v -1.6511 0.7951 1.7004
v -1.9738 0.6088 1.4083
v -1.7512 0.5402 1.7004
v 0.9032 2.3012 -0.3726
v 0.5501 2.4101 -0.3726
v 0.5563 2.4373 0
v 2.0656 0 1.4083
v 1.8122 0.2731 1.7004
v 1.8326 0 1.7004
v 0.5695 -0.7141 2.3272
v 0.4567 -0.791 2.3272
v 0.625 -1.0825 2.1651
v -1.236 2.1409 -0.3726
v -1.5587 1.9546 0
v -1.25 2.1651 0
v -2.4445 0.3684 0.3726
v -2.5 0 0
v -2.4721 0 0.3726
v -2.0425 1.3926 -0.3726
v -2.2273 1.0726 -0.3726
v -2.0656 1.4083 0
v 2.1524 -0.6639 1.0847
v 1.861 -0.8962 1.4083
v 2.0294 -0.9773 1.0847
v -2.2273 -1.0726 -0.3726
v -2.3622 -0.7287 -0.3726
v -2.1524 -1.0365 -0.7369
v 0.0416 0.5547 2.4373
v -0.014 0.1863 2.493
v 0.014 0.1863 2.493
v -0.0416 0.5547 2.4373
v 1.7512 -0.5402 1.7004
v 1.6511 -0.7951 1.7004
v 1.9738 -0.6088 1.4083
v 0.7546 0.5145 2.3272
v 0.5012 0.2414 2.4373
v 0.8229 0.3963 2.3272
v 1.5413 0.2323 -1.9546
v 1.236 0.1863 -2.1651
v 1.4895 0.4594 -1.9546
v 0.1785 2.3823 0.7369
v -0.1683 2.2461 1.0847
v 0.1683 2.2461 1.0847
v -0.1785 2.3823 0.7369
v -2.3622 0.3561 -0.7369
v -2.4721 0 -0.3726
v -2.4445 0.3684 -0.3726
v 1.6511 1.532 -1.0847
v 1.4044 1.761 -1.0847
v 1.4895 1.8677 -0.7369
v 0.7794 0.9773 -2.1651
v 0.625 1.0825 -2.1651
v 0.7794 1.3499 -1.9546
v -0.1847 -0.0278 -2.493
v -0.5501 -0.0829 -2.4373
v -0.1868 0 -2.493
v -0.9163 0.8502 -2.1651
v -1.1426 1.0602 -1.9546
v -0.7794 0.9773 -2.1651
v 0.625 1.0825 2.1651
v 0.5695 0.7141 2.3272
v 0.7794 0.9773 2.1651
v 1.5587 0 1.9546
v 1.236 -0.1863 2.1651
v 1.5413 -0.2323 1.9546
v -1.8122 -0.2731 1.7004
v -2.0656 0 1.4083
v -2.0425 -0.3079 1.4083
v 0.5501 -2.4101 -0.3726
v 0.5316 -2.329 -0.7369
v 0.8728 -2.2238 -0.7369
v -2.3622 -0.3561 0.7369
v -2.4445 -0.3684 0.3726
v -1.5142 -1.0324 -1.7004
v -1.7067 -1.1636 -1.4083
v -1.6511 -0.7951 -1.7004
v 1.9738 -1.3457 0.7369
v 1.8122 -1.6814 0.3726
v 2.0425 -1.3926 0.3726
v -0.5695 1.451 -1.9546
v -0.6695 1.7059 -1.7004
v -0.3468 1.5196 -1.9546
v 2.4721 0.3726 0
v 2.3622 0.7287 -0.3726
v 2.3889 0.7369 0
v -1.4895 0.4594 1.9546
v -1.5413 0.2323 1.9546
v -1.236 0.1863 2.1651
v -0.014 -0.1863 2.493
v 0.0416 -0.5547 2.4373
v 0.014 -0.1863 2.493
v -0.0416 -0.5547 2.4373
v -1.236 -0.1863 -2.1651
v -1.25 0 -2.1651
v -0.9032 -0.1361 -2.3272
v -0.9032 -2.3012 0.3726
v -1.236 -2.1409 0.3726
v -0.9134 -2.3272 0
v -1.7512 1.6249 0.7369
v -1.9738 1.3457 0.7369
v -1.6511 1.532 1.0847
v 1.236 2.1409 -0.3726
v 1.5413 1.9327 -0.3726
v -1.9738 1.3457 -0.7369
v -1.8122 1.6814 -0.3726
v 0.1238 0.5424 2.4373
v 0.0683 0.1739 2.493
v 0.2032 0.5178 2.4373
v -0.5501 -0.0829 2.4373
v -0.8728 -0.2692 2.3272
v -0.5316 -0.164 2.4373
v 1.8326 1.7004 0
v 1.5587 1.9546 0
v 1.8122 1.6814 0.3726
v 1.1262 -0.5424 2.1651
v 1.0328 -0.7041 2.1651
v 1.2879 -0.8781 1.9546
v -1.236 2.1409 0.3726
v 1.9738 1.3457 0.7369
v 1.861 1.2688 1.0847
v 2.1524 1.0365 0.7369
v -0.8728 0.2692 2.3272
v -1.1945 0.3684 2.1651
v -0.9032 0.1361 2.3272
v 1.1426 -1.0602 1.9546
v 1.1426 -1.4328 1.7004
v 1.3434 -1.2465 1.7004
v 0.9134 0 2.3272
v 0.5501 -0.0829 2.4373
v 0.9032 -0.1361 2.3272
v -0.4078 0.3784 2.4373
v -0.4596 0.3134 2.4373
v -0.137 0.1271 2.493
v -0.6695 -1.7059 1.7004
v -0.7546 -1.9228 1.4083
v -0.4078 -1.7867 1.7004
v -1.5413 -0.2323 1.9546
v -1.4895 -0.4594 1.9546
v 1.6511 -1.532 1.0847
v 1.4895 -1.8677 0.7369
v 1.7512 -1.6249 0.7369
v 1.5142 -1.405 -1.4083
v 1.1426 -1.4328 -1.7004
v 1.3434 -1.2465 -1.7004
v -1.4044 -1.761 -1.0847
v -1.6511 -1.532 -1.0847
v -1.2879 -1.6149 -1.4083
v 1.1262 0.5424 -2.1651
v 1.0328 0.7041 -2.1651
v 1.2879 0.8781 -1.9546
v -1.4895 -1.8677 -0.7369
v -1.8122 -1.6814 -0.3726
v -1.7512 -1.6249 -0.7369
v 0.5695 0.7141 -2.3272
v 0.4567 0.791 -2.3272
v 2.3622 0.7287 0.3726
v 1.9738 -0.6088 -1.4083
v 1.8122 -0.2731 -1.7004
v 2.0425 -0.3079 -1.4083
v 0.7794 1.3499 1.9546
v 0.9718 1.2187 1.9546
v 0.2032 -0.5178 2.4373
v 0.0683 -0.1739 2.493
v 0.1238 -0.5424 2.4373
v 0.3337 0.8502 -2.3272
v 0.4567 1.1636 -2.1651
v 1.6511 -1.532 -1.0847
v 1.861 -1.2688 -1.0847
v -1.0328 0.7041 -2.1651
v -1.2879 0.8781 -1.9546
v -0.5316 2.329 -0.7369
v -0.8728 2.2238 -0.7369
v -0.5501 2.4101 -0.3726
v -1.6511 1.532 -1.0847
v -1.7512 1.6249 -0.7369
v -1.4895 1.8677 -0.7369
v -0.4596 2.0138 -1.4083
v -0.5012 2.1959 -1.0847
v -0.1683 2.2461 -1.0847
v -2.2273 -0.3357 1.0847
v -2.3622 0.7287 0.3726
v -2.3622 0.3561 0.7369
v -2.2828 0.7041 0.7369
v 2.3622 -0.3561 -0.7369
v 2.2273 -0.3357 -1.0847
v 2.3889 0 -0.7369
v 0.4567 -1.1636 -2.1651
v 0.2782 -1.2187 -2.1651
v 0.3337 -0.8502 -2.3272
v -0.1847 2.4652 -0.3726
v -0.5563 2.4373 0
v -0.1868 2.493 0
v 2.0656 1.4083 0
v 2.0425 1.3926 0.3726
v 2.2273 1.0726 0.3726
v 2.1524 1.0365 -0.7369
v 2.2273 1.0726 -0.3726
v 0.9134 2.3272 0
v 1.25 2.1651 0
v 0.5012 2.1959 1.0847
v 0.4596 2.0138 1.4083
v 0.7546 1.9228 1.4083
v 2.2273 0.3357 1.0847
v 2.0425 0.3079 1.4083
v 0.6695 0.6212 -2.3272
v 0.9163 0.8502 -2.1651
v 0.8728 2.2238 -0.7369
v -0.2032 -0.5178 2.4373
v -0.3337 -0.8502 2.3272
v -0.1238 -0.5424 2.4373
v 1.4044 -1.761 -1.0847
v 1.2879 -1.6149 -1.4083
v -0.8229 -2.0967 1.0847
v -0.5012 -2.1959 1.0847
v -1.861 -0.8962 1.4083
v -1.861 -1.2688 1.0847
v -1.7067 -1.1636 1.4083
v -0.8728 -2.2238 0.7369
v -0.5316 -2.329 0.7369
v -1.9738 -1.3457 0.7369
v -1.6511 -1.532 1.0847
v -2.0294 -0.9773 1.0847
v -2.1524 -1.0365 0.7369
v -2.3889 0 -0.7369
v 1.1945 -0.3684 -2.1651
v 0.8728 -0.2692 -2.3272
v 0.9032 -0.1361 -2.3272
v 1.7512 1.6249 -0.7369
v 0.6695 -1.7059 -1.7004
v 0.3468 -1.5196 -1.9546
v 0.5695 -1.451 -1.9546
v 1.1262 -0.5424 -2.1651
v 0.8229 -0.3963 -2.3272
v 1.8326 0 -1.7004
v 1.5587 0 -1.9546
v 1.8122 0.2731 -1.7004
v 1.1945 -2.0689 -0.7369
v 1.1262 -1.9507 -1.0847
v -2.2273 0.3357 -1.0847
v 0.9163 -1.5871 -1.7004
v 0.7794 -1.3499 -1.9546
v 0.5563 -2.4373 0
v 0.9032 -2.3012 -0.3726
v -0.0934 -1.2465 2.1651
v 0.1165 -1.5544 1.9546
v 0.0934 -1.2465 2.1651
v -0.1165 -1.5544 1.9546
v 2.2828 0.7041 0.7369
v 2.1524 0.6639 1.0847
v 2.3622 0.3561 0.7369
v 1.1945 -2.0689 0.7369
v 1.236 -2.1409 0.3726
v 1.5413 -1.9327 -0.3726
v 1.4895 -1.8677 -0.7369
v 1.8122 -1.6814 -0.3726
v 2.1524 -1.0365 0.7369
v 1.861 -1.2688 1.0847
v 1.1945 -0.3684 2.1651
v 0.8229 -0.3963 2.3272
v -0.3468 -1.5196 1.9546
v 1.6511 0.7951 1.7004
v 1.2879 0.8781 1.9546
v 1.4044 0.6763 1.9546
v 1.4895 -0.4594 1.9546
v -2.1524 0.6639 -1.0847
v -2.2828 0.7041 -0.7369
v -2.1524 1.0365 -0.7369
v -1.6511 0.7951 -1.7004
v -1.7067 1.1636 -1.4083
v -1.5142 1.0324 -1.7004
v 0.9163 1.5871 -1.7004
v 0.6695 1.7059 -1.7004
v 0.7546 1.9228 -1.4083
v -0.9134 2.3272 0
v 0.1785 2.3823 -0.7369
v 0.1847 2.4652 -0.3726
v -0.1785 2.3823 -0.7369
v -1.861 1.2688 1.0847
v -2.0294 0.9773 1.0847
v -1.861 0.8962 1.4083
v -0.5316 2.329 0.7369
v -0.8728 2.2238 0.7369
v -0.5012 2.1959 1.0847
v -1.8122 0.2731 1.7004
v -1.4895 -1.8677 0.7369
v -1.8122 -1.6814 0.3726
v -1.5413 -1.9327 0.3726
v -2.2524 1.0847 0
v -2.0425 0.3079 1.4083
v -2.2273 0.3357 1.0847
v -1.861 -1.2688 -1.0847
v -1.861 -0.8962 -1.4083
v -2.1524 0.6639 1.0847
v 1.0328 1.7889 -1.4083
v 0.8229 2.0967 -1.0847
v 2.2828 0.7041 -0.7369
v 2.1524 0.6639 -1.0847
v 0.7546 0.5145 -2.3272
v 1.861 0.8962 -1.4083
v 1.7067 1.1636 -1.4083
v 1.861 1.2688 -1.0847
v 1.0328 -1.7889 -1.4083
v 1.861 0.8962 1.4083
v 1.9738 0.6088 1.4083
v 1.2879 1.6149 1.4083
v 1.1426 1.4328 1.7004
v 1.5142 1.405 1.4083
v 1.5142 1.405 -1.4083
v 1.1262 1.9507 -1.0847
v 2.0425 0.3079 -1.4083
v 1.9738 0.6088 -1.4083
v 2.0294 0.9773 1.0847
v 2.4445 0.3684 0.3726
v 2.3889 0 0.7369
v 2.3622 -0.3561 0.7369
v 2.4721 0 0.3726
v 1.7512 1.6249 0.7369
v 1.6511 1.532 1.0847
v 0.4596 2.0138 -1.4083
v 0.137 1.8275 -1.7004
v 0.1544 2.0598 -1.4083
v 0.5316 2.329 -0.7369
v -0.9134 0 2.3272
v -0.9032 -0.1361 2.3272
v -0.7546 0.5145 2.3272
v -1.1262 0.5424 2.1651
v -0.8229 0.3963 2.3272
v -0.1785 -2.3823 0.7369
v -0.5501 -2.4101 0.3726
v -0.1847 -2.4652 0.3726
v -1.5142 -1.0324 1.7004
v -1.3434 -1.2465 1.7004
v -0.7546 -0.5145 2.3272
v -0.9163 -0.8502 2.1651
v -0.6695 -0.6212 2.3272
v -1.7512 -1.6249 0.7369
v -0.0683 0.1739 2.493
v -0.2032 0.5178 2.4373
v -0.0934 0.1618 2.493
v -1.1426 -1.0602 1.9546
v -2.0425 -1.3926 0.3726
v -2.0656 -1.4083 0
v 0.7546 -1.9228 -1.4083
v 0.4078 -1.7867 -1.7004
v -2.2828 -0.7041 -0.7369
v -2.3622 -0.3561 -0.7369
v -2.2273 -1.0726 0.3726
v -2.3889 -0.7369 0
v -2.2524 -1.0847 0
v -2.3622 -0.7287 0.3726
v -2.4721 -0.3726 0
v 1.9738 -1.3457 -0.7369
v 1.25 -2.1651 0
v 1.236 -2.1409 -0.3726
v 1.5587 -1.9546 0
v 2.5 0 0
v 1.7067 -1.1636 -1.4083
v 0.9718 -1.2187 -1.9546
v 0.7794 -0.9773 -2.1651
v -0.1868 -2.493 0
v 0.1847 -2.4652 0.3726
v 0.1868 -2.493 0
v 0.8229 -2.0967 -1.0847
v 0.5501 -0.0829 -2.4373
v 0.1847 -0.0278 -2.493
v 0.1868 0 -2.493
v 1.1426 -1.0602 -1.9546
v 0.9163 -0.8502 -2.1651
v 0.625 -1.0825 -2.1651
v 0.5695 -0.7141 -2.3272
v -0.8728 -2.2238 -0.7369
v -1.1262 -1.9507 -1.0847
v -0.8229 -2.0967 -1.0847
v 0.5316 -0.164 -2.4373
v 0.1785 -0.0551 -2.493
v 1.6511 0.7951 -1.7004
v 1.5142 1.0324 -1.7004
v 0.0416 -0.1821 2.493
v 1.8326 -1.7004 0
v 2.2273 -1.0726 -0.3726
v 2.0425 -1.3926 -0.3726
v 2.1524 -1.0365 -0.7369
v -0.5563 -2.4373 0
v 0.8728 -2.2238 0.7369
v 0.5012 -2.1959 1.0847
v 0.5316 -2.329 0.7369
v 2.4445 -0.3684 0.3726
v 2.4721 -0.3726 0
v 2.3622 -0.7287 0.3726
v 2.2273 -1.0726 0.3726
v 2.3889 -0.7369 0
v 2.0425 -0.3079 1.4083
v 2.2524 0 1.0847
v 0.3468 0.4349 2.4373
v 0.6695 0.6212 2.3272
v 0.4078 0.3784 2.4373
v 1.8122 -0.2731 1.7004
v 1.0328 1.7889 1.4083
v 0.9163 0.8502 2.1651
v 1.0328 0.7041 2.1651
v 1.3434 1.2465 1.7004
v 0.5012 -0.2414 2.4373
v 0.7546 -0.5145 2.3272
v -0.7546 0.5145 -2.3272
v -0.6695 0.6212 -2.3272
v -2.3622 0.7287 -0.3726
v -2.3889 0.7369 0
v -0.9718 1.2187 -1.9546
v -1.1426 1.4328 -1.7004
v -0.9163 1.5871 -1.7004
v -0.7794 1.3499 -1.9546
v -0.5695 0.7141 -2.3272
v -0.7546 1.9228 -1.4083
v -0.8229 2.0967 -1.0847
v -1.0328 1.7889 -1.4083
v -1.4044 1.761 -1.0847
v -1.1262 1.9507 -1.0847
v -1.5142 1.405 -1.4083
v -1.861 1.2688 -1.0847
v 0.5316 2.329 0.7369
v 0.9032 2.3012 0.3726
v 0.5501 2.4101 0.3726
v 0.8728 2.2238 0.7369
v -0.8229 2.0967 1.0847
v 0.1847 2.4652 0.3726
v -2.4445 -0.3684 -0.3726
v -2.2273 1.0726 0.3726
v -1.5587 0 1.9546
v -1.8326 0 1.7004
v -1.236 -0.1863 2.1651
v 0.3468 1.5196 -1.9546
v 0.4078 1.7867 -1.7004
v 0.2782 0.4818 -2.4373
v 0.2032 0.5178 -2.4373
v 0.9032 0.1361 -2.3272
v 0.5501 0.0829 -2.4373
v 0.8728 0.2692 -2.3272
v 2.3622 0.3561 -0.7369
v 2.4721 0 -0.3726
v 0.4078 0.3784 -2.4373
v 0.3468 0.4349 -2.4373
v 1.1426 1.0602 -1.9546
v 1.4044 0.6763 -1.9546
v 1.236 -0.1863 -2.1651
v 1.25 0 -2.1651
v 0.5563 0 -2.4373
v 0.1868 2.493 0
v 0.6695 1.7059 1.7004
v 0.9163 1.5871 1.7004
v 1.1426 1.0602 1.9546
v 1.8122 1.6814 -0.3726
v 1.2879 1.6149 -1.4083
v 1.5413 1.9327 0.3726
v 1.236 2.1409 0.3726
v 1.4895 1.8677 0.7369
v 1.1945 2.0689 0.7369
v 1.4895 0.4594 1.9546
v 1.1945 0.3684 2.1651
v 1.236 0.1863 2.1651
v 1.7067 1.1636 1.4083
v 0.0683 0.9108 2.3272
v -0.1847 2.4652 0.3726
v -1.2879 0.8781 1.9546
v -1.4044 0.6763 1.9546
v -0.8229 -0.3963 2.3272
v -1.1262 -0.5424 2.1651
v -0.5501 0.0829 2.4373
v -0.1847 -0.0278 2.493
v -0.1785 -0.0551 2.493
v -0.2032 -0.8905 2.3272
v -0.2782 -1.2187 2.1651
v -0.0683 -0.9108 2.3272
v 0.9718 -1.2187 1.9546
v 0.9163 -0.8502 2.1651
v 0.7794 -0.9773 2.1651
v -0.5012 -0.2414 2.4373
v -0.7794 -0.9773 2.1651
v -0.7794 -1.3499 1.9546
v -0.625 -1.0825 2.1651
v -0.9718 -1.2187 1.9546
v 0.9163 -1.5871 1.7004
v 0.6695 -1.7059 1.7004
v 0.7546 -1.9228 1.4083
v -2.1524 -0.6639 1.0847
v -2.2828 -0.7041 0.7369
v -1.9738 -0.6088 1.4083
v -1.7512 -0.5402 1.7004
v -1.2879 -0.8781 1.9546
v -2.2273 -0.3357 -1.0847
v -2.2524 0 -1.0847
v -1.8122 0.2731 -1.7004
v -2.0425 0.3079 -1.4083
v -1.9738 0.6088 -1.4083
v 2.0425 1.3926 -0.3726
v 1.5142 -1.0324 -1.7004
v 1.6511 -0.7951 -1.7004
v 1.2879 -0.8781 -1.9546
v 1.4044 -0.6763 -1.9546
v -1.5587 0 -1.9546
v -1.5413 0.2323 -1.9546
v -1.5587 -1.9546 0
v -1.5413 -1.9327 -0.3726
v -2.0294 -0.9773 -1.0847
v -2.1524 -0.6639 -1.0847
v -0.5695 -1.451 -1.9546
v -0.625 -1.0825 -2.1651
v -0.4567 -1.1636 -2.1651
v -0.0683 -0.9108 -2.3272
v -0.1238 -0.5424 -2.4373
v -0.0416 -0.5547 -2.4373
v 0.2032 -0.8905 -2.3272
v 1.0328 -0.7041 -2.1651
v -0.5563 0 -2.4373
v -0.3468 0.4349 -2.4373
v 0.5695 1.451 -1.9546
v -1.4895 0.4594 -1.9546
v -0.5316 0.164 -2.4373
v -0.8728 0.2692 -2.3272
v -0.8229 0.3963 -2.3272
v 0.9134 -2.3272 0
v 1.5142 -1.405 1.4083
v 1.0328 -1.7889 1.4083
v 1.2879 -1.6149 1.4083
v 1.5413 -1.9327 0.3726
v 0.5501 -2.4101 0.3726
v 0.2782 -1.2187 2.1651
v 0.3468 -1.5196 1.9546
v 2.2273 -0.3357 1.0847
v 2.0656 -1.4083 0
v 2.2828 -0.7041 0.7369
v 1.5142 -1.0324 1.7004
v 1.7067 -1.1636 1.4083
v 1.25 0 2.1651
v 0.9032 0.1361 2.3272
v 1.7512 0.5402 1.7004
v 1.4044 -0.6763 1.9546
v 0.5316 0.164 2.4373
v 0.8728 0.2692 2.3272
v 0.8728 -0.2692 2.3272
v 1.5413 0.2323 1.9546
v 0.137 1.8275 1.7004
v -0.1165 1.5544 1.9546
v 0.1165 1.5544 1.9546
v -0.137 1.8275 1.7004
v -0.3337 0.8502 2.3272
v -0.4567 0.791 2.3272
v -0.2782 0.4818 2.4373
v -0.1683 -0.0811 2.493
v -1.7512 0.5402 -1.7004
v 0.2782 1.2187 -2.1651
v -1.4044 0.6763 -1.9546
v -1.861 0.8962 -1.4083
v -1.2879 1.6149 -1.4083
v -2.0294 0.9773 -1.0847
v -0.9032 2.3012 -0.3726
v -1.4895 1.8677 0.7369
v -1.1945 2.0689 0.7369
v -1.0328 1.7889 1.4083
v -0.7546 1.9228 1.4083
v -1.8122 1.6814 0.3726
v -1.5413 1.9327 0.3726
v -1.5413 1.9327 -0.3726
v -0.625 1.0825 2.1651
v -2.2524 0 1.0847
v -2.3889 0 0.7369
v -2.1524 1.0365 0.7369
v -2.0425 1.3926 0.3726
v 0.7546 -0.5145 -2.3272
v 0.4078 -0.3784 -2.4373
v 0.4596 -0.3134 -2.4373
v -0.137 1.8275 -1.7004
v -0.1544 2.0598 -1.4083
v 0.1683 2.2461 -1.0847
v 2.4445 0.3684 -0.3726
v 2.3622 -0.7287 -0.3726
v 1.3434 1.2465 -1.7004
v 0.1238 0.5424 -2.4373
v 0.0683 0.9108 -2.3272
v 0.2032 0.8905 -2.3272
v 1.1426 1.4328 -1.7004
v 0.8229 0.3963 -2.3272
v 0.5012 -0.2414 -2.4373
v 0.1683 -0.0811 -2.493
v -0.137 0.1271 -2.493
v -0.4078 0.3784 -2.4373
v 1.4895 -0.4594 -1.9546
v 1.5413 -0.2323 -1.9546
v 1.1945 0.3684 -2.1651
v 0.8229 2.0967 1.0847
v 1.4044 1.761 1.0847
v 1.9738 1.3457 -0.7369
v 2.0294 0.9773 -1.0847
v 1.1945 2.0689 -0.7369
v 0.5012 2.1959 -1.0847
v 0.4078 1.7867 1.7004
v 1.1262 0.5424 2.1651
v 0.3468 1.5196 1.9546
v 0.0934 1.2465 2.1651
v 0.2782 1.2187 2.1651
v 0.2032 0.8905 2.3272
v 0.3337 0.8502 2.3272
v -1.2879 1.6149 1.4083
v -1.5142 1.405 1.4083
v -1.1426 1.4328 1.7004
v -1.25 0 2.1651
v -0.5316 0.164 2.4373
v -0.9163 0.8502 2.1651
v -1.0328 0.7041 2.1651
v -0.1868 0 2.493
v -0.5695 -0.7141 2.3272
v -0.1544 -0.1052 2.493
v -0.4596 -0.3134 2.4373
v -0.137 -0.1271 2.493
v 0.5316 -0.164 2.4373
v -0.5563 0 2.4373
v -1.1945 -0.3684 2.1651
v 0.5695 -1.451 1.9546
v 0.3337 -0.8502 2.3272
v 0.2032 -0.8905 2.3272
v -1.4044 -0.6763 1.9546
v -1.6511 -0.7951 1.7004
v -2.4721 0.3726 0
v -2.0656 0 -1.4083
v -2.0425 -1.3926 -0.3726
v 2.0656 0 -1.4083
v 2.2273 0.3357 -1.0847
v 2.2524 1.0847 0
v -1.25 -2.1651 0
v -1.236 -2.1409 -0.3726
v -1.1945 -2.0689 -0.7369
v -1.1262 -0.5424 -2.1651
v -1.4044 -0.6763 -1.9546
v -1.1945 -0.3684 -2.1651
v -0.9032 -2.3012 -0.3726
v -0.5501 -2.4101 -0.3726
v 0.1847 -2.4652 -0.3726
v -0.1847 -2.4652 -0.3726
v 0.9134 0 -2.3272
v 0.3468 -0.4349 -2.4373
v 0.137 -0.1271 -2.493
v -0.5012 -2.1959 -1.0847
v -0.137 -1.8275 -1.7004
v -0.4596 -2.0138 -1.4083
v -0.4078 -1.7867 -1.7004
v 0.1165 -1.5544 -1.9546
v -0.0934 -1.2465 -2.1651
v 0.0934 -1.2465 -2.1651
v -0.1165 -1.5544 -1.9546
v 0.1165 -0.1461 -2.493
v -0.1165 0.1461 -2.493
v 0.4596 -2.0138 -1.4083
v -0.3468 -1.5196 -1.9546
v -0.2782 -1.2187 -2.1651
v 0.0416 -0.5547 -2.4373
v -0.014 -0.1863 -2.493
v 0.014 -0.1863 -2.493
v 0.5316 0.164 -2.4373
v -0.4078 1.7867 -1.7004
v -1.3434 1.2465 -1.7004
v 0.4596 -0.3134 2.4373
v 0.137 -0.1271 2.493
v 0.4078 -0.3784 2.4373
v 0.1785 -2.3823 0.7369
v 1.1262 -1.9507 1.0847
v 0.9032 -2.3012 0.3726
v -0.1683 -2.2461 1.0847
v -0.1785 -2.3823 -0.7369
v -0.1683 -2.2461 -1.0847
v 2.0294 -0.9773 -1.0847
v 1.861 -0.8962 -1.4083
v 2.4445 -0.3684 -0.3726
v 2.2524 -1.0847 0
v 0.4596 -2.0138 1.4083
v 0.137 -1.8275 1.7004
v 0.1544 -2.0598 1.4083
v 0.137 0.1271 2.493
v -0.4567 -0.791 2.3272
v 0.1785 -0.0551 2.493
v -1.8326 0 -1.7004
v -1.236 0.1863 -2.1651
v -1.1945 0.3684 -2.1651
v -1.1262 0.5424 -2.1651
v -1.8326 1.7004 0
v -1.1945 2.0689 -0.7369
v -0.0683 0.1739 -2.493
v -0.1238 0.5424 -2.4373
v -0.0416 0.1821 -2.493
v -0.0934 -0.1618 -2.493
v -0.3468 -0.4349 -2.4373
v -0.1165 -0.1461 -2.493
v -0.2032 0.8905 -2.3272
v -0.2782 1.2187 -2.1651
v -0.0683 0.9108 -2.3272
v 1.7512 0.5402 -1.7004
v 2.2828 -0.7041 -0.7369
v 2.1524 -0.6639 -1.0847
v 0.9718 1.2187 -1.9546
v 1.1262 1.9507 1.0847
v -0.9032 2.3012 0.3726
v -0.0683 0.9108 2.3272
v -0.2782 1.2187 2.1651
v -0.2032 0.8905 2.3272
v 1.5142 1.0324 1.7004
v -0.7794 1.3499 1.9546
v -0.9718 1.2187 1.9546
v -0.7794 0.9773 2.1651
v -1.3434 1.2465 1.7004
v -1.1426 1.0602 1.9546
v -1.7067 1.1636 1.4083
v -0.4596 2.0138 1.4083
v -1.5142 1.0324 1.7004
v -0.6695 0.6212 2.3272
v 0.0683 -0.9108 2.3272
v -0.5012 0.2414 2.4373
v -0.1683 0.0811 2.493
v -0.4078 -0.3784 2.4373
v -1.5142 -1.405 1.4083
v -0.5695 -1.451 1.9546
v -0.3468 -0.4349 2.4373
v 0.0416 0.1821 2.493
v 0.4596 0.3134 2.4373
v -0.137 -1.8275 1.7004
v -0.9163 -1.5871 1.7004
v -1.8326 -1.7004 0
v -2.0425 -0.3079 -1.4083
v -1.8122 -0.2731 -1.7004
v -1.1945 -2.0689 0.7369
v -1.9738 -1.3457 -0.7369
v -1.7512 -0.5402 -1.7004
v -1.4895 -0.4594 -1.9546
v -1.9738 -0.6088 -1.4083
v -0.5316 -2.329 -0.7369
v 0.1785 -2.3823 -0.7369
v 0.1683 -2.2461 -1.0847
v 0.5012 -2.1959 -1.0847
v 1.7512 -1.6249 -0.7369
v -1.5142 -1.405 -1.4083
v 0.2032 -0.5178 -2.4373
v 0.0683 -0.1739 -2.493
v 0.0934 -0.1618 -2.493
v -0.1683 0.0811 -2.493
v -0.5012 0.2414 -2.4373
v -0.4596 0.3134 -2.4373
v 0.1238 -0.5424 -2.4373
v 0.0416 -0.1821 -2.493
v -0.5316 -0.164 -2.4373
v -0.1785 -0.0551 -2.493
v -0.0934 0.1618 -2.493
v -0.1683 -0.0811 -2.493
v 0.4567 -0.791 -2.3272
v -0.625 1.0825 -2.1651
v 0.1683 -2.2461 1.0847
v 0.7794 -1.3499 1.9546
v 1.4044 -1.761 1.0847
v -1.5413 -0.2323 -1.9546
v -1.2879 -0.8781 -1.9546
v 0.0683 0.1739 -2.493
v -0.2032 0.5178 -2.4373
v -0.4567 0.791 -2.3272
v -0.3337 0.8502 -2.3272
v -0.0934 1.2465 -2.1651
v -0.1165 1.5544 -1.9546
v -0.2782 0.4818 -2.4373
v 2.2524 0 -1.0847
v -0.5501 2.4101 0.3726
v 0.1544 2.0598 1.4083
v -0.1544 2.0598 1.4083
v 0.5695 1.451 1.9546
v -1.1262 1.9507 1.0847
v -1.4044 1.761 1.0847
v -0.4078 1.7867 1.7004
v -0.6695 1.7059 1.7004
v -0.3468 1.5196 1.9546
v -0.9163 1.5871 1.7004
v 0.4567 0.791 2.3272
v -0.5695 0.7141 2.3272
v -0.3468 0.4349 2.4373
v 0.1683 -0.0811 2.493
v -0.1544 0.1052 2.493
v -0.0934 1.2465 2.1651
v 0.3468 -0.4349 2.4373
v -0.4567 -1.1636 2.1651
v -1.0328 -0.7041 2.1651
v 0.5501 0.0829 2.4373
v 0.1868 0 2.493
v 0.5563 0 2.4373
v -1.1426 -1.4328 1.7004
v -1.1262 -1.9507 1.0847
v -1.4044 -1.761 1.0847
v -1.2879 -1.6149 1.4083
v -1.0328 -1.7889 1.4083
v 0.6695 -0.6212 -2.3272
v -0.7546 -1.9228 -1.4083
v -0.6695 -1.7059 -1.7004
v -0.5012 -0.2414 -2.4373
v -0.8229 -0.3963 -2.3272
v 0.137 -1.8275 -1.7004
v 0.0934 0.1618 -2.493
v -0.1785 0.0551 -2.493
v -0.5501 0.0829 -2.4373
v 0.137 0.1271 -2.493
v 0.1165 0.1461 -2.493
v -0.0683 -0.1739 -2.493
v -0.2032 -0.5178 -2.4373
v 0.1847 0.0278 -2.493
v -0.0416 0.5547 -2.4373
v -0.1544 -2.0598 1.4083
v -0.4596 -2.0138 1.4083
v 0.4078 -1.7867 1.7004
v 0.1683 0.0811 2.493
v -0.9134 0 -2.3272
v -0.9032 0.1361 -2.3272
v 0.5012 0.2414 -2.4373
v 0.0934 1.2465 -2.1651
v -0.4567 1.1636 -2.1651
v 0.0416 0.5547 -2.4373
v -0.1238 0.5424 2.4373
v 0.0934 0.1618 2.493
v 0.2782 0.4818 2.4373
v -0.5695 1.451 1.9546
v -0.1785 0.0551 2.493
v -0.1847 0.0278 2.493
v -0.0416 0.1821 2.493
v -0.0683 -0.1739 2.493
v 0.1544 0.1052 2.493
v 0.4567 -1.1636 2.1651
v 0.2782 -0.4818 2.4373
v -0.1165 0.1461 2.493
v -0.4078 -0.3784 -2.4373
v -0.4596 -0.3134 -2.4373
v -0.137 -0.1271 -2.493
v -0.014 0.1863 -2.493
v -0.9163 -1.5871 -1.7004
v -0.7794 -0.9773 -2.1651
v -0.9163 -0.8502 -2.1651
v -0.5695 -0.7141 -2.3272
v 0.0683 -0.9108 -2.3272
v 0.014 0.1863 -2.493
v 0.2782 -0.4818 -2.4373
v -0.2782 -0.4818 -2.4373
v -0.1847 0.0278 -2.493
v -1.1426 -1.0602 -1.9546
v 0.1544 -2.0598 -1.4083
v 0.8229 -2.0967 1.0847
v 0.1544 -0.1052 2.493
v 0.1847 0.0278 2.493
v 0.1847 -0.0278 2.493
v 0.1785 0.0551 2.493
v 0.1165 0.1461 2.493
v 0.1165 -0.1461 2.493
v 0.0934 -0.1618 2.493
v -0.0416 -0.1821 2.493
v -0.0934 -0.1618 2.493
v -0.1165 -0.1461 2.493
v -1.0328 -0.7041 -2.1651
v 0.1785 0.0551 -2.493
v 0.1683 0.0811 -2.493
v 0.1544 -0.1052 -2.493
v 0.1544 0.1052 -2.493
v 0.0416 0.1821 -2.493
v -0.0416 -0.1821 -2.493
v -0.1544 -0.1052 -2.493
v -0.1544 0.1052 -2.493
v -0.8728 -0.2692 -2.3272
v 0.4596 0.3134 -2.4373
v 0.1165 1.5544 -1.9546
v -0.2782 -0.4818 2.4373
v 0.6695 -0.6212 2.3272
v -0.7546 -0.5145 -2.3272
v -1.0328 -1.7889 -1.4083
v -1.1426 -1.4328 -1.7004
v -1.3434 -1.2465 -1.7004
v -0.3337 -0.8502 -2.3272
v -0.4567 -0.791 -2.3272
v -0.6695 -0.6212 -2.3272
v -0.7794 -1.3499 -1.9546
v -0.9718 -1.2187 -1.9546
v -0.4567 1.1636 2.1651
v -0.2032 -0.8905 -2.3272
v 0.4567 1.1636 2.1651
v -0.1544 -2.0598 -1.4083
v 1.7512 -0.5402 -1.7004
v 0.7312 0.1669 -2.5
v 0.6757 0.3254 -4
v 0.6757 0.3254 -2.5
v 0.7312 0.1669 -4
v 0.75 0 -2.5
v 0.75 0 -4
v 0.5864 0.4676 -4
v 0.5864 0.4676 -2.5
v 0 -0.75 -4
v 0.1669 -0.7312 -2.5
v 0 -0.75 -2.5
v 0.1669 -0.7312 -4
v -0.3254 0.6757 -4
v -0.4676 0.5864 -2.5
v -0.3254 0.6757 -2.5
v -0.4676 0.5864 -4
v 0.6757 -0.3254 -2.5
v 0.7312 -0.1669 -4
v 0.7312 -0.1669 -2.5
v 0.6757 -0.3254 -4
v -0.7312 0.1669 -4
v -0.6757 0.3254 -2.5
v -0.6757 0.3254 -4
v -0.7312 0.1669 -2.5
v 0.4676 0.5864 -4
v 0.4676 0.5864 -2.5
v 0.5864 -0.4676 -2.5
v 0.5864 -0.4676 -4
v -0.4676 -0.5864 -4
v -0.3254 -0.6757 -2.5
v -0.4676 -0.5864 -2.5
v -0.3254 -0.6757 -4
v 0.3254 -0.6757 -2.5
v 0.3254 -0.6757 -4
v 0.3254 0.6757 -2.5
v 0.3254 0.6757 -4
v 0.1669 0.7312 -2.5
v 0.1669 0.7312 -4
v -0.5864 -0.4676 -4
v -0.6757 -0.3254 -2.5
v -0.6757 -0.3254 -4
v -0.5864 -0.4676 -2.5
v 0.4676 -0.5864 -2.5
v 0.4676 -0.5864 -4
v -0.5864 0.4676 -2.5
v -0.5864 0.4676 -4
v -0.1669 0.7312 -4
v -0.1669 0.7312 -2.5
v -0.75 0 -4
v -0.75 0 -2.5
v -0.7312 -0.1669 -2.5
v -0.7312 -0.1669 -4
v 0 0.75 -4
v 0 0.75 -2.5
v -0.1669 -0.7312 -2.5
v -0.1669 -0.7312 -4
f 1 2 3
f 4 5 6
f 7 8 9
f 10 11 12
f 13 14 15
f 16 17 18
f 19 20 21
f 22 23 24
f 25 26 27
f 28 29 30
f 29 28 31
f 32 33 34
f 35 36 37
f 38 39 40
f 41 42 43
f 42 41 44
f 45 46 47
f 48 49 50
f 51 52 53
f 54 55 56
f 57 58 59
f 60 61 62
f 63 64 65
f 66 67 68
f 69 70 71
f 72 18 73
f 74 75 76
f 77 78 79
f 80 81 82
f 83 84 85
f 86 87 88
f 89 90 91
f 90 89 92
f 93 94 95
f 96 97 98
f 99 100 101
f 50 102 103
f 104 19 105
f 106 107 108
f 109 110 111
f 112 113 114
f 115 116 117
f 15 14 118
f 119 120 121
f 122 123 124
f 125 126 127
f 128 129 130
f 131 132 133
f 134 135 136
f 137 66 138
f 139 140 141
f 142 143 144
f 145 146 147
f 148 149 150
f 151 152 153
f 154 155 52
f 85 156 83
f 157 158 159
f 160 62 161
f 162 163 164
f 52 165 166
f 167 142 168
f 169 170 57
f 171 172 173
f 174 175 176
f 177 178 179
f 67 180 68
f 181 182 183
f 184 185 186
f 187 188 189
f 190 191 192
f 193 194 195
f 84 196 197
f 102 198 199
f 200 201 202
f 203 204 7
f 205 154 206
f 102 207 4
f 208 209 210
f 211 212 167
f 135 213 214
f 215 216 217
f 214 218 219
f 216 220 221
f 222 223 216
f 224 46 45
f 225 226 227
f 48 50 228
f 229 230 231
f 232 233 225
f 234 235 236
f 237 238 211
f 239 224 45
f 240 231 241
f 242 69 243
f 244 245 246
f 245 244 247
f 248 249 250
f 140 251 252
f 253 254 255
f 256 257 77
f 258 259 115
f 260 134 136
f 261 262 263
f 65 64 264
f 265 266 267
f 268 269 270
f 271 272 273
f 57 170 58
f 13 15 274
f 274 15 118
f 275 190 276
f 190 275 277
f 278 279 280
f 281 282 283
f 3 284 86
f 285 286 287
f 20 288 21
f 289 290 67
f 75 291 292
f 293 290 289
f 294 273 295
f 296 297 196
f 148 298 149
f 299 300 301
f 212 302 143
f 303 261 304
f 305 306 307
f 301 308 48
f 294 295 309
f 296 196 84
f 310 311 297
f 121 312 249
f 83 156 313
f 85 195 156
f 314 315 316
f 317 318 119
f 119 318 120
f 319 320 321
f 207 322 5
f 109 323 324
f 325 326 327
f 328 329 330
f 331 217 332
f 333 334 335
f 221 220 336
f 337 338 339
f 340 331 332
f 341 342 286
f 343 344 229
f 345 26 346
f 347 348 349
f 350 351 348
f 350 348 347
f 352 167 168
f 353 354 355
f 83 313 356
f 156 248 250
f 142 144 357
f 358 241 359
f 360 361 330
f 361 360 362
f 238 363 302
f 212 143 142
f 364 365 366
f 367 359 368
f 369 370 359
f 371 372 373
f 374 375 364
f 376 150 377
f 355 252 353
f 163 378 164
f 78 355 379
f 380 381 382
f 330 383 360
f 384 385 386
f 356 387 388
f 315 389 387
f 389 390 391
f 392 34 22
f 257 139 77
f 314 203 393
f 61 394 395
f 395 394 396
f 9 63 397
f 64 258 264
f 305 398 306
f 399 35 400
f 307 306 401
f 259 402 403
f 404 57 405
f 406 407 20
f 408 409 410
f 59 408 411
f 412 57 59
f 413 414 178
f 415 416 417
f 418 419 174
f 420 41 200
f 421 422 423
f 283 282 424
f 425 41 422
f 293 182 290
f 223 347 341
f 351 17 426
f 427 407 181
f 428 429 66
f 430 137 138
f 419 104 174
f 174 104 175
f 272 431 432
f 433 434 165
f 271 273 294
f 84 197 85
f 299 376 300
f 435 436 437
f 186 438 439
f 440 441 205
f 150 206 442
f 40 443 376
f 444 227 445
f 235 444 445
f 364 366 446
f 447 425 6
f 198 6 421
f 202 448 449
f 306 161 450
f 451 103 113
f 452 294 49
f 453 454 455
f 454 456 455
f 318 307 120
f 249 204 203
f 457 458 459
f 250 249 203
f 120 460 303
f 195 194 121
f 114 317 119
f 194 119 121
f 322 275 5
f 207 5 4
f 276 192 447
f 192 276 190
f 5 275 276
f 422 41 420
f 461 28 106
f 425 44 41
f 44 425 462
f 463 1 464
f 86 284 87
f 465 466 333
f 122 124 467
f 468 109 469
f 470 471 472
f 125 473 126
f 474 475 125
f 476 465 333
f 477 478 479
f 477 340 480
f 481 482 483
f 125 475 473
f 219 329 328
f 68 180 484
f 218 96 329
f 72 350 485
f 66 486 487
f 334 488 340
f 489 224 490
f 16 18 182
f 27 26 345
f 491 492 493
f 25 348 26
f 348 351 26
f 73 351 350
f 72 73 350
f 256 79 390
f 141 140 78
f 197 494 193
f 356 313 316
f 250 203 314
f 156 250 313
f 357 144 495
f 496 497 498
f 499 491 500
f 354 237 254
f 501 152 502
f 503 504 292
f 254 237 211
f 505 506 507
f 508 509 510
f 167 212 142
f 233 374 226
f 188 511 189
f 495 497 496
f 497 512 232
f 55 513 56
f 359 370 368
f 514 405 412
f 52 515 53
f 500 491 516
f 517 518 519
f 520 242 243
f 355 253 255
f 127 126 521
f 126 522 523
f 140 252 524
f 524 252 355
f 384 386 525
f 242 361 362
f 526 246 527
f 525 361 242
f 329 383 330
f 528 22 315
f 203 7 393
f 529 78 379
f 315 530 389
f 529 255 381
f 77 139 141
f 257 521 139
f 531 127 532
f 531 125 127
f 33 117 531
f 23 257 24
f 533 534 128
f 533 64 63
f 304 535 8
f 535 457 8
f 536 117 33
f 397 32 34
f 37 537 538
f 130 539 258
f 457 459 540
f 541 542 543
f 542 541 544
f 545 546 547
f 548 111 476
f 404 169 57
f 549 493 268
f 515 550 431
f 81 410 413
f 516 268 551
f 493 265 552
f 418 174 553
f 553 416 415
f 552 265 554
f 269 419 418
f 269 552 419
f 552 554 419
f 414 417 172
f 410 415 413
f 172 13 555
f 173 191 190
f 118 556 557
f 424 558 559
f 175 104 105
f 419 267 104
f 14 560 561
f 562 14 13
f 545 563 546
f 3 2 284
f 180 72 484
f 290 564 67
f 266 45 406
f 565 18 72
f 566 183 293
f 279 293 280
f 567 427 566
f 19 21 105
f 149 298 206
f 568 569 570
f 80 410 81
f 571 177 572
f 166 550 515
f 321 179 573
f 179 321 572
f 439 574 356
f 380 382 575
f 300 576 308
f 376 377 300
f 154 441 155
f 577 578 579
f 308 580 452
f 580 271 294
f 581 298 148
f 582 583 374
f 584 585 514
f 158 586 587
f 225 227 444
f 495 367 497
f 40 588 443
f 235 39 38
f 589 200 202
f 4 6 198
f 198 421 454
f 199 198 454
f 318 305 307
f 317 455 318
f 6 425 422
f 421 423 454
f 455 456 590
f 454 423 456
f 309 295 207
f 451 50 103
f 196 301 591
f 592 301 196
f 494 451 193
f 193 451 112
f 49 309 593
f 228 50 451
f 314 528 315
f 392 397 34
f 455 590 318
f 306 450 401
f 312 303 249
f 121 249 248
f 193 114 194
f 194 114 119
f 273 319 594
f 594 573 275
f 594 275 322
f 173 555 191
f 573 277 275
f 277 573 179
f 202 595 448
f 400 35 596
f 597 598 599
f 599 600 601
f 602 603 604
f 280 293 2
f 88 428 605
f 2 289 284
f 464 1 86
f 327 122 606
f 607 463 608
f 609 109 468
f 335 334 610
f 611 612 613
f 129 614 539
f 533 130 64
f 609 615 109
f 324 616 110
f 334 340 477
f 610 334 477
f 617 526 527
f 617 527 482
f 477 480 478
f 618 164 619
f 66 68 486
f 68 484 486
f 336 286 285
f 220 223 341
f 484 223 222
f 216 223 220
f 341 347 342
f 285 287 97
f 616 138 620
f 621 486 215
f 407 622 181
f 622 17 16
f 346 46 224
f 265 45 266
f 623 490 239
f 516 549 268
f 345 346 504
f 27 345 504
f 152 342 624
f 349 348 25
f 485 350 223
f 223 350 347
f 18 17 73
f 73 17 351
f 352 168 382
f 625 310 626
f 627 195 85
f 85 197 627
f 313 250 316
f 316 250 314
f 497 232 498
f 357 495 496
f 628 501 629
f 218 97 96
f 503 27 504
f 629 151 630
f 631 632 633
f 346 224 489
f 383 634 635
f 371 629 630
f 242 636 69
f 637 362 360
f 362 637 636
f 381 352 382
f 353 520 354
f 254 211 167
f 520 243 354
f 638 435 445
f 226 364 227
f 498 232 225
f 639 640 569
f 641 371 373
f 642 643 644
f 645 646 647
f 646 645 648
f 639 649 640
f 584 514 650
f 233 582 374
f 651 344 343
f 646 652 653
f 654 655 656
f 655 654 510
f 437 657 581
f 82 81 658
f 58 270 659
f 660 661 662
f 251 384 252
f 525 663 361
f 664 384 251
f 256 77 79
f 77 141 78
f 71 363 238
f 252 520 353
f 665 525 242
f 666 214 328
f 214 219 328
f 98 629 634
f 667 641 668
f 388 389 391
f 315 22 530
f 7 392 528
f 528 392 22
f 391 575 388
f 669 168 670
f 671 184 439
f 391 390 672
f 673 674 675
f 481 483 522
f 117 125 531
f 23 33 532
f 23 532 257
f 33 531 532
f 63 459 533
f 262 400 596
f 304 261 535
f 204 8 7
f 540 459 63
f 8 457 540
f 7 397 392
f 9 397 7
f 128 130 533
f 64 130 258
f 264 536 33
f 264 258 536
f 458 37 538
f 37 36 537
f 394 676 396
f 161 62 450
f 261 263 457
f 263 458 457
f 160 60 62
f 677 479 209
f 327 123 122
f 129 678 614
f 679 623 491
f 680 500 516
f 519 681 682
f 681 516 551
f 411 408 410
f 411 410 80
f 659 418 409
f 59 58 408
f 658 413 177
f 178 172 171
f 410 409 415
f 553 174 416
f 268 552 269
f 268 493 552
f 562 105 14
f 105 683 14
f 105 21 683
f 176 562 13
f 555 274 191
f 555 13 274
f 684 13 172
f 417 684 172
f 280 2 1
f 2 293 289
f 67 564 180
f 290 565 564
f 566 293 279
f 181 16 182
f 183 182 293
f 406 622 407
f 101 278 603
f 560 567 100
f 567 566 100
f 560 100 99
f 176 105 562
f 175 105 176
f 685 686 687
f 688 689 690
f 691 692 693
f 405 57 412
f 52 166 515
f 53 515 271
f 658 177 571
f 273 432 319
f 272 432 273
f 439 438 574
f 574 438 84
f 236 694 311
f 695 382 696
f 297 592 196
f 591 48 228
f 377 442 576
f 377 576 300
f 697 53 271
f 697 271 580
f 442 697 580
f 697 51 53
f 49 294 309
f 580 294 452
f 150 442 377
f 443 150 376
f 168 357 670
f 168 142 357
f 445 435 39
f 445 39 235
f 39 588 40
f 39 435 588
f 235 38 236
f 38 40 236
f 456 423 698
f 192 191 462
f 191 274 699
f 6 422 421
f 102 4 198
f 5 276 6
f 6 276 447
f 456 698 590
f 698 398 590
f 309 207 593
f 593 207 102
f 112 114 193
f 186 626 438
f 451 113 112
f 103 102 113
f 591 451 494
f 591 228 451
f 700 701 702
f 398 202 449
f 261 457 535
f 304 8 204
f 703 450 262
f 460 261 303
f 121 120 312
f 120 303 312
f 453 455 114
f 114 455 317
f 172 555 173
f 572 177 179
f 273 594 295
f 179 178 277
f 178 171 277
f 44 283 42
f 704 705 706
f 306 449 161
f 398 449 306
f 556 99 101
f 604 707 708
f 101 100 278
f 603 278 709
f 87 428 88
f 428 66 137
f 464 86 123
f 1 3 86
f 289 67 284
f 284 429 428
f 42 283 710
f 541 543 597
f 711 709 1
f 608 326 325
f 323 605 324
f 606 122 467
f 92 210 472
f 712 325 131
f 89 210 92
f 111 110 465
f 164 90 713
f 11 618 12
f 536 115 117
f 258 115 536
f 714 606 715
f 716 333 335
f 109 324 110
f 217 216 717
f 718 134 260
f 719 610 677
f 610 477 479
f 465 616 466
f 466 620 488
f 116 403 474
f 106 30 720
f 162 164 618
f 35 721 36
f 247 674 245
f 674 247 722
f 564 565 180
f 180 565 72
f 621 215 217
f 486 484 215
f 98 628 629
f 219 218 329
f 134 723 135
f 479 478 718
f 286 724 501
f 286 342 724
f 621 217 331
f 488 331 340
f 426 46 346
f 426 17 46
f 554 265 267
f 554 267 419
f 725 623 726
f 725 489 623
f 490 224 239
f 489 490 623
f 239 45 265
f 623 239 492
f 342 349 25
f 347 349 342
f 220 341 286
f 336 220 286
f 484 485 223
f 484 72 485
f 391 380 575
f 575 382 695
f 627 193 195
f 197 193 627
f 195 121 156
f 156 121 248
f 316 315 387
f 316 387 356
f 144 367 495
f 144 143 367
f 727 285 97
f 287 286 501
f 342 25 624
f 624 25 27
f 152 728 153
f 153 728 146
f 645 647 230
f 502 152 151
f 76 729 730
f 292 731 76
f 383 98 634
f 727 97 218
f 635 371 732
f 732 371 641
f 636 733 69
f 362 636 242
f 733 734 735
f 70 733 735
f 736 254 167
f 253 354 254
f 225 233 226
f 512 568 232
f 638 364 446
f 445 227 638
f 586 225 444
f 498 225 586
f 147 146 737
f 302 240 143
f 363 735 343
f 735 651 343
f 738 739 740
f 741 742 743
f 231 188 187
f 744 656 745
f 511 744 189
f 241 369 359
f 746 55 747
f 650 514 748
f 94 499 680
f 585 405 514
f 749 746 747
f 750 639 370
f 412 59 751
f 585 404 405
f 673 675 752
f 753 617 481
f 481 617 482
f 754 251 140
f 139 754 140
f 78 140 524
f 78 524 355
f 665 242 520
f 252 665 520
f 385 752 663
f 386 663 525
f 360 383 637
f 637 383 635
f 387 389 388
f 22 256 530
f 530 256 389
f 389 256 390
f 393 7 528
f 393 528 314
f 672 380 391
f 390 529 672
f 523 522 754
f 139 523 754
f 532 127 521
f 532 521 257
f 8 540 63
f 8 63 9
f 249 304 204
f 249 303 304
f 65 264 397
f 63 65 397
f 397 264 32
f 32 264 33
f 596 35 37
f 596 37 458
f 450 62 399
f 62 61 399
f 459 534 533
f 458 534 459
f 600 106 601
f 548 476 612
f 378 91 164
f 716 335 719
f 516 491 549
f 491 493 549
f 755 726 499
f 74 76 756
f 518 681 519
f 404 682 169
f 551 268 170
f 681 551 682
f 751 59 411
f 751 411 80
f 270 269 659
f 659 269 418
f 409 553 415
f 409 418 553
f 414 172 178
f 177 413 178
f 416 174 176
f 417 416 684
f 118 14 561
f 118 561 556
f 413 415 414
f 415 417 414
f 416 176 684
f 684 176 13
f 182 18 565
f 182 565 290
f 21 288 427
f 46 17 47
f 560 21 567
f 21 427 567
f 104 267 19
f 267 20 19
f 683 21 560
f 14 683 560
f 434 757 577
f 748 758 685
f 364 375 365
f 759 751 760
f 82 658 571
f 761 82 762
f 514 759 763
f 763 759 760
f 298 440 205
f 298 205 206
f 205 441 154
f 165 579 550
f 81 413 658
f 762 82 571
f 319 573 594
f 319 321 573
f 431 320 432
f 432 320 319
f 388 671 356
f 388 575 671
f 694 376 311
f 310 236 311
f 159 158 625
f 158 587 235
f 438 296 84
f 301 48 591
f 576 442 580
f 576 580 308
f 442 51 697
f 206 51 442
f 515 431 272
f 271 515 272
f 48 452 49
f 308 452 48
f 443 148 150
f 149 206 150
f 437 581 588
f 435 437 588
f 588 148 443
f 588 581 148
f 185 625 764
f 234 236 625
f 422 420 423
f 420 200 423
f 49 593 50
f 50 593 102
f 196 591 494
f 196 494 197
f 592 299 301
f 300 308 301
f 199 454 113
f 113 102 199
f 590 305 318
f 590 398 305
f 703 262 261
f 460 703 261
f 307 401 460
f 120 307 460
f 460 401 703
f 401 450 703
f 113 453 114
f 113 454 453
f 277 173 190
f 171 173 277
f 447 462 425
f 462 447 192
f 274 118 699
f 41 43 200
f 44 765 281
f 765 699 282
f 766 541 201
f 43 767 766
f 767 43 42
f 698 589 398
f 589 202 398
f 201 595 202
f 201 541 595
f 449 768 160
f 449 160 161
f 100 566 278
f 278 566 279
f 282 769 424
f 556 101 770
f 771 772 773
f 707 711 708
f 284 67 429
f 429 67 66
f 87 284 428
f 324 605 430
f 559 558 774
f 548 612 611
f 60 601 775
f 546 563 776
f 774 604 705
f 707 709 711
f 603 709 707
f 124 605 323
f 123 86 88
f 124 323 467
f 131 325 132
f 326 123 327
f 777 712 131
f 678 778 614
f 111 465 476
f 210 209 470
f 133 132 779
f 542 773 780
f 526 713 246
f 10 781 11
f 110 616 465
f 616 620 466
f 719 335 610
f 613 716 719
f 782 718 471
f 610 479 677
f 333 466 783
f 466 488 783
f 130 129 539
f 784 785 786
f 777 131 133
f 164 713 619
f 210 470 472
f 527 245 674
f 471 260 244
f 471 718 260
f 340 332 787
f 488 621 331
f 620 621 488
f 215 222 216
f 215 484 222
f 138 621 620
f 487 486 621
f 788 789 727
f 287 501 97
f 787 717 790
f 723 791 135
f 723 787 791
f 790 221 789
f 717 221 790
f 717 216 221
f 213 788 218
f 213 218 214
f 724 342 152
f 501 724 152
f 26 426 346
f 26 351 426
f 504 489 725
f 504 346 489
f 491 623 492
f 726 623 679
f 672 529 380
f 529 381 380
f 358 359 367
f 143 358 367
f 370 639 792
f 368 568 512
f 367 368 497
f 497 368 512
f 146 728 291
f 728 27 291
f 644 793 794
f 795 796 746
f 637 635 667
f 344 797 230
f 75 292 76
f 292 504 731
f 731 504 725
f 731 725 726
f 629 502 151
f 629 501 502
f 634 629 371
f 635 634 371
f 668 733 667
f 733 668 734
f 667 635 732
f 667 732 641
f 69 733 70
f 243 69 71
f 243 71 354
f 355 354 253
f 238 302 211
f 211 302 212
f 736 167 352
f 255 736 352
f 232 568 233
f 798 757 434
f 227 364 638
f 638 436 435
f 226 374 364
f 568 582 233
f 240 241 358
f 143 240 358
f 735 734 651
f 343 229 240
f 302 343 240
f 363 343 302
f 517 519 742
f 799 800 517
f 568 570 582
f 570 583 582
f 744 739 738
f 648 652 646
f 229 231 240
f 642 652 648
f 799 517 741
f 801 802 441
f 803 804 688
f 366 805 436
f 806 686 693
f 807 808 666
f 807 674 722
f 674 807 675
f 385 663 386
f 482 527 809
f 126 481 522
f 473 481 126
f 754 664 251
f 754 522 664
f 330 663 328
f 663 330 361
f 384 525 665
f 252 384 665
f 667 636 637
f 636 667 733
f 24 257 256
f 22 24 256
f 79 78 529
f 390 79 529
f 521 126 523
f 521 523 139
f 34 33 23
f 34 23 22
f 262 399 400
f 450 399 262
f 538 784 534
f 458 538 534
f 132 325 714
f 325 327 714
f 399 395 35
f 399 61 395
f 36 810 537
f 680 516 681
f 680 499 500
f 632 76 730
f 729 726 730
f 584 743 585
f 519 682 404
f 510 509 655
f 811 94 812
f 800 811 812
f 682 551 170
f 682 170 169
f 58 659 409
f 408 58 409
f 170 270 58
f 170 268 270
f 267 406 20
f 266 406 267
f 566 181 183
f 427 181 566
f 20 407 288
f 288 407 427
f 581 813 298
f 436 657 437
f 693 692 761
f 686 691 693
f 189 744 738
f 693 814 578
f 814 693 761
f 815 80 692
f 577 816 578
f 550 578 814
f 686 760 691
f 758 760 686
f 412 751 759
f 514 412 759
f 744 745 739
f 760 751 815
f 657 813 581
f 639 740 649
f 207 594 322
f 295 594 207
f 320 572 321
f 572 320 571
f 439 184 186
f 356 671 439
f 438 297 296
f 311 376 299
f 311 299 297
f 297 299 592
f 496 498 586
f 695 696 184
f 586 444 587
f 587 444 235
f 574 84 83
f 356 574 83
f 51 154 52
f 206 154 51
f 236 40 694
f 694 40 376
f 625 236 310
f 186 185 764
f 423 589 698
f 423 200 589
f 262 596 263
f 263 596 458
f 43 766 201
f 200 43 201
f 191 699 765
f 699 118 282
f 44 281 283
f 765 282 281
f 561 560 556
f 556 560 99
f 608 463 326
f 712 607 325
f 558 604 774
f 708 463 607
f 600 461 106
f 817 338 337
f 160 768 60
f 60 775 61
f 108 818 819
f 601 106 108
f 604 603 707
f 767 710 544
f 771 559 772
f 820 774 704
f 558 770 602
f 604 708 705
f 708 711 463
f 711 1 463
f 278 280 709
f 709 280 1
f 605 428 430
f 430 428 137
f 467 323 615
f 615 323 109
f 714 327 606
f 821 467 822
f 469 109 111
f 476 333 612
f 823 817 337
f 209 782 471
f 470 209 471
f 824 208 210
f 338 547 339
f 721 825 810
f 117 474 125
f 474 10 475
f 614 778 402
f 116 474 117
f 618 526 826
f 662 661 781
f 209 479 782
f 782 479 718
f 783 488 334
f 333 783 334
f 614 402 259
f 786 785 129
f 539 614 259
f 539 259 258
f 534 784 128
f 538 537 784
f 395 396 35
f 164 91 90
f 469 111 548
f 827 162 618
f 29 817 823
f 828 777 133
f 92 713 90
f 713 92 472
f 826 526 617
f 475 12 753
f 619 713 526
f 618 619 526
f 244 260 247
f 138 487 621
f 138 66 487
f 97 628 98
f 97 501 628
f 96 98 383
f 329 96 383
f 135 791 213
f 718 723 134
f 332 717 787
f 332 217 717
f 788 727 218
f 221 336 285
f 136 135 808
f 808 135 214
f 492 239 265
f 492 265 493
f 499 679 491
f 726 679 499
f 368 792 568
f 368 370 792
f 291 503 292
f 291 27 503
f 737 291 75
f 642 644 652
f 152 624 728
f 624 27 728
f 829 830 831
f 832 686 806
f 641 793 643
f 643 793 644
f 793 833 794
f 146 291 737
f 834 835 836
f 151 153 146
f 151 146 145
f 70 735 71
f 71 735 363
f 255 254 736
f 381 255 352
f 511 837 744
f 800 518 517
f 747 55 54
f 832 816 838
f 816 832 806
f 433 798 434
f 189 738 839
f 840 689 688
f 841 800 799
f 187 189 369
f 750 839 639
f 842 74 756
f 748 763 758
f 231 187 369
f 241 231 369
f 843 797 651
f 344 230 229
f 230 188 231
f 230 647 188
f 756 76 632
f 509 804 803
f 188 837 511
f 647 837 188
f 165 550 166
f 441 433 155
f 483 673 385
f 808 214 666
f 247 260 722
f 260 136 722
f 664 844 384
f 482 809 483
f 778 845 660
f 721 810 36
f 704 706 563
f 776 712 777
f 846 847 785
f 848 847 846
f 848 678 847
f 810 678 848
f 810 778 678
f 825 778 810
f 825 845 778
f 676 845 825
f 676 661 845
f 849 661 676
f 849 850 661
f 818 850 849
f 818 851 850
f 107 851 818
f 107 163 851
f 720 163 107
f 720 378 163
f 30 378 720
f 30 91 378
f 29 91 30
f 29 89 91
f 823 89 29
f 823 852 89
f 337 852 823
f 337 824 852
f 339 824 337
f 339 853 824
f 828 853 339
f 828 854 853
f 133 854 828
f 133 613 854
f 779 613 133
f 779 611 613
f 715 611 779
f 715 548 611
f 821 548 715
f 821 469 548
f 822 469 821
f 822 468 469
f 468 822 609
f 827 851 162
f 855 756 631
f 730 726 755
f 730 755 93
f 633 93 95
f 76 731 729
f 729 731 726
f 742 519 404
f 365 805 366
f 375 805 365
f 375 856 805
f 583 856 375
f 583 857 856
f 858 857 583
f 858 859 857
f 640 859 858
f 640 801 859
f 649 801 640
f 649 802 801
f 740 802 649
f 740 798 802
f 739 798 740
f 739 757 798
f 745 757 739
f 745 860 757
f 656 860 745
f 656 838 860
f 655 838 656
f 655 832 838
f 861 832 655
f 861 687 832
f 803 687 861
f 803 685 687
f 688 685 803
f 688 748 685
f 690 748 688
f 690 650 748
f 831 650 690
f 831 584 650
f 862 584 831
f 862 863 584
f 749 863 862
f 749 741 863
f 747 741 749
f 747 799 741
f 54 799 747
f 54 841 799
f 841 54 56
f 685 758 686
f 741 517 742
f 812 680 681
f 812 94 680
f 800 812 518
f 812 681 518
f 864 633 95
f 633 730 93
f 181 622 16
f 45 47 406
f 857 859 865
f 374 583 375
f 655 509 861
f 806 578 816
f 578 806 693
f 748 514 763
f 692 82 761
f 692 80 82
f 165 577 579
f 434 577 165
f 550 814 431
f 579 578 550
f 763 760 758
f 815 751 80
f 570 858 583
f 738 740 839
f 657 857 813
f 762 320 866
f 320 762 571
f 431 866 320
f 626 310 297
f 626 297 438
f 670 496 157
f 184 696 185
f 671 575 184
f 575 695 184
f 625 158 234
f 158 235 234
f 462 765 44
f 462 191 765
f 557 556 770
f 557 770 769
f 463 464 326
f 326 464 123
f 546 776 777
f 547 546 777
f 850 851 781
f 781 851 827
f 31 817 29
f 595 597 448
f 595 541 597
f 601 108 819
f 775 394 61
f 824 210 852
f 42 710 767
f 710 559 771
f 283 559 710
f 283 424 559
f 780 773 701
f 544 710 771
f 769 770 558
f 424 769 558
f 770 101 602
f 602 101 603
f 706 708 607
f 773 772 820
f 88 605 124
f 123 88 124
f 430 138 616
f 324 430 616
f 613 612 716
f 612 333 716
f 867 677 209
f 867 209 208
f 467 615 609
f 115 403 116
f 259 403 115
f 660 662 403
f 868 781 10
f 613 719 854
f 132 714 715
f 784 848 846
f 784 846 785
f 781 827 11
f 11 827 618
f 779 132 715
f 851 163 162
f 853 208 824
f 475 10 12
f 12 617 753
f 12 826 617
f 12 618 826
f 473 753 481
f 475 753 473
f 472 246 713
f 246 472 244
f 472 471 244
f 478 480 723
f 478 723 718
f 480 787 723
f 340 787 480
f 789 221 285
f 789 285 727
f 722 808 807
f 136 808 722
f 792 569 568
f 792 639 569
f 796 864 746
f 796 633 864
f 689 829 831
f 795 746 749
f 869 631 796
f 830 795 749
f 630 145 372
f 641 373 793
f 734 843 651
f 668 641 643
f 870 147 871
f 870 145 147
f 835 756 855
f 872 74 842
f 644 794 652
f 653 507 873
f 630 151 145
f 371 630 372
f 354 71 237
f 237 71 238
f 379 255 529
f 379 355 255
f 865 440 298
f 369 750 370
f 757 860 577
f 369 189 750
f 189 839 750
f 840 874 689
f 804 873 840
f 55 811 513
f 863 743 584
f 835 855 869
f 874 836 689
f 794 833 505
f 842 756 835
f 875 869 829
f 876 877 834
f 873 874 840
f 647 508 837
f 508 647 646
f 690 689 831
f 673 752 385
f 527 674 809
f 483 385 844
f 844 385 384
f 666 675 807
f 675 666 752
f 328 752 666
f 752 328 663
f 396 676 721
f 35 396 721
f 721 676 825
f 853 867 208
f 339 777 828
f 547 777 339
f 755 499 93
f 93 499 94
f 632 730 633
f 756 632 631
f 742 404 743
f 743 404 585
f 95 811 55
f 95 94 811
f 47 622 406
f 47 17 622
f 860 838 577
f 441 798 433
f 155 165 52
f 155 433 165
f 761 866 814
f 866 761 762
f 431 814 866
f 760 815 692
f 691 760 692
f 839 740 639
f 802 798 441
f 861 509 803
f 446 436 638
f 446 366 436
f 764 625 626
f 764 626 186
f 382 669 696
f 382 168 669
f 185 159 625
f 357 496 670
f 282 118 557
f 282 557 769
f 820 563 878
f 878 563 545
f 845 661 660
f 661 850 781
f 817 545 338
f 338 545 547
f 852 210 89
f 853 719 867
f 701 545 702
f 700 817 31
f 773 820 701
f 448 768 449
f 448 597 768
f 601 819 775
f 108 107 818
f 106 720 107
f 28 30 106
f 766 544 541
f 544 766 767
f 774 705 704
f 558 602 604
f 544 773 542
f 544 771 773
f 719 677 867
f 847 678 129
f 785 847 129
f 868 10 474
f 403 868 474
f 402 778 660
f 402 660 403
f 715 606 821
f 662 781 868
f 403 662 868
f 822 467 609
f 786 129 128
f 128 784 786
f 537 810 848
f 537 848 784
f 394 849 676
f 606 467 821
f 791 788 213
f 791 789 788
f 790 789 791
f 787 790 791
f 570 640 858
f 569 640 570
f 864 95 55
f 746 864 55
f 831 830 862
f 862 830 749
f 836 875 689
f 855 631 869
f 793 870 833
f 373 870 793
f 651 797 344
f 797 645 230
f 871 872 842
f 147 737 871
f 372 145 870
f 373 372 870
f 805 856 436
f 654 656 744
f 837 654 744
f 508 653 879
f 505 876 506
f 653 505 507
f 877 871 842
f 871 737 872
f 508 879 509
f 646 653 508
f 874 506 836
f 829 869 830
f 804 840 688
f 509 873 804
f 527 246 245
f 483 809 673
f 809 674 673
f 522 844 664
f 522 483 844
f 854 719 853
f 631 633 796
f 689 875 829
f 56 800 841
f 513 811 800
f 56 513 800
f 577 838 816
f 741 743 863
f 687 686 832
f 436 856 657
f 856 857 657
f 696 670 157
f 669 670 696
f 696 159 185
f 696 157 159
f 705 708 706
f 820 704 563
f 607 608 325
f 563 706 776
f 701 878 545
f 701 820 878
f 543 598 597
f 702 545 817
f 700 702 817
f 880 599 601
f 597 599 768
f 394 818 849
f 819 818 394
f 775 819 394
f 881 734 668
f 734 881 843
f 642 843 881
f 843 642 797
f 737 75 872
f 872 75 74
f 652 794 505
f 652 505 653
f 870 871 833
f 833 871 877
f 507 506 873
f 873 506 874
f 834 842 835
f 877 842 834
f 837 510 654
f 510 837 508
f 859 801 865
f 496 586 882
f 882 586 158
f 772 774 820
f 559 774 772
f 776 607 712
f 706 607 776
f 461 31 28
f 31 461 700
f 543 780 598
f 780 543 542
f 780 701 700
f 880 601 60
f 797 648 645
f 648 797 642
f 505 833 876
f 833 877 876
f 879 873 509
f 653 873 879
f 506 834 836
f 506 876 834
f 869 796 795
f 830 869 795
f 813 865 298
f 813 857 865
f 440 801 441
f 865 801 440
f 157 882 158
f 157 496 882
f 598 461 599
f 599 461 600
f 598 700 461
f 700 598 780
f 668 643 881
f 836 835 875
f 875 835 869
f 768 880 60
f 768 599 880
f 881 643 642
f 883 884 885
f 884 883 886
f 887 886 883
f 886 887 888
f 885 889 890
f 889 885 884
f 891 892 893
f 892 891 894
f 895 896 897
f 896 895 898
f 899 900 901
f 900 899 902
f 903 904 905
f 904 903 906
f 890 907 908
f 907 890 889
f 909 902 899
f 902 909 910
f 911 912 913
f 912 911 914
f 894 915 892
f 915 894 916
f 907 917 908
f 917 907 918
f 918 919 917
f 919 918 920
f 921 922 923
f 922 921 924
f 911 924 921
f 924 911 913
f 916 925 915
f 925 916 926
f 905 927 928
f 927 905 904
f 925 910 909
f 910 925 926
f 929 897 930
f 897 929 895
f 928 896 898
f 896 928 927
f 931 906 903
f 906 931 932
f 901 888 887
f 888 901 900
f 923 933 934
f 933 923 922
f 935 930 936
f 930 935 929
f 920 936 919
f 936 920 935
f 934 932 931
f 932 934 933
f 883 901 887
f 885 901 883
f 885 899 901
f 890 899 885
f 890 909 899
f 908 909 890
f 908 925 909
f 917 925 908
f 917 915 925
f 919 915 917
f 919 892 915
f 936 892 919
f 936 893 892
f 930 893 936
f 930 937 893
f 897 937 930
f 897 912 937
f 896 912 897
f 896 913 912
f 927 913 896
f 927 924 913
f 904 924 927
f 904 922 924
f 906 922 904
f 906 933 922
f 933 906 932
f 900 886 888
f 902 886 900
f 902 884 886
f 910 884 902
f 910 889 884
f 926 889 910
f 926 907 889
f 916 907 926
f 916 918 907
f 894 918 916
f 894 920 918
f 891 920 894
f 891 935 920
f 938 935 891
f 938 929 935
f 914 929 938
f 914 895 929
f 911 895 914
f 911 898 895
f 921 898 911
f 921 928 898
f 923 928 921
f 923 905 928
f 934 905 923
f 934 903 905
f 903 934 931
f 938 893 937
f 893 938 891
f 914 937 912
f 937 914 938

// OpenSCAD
// part_id: dat3
// name: Date pointer ball tip (large)
// source_drawing_ids: DRW-008
// units: mm
// revision: 0.1
// SPDX-License-Identifier: MIT

module part_dat3(ball_d = 5.0, pin_d = 1.5, pin_l = 1.5) {
    union() {
        sphere(d = ball_d, $fn = 42);
        translate([0, 0, -ball_d / 2 - pin_l])
            cylinder(d = pin_d, h = pin_l, center = false, $fn = 28);
    }
}

// ---- "main guard" ----
// Default to previewing when opened directly:
if (is_undef(__LIB_MODE__)) {
    part_dat3();
}
